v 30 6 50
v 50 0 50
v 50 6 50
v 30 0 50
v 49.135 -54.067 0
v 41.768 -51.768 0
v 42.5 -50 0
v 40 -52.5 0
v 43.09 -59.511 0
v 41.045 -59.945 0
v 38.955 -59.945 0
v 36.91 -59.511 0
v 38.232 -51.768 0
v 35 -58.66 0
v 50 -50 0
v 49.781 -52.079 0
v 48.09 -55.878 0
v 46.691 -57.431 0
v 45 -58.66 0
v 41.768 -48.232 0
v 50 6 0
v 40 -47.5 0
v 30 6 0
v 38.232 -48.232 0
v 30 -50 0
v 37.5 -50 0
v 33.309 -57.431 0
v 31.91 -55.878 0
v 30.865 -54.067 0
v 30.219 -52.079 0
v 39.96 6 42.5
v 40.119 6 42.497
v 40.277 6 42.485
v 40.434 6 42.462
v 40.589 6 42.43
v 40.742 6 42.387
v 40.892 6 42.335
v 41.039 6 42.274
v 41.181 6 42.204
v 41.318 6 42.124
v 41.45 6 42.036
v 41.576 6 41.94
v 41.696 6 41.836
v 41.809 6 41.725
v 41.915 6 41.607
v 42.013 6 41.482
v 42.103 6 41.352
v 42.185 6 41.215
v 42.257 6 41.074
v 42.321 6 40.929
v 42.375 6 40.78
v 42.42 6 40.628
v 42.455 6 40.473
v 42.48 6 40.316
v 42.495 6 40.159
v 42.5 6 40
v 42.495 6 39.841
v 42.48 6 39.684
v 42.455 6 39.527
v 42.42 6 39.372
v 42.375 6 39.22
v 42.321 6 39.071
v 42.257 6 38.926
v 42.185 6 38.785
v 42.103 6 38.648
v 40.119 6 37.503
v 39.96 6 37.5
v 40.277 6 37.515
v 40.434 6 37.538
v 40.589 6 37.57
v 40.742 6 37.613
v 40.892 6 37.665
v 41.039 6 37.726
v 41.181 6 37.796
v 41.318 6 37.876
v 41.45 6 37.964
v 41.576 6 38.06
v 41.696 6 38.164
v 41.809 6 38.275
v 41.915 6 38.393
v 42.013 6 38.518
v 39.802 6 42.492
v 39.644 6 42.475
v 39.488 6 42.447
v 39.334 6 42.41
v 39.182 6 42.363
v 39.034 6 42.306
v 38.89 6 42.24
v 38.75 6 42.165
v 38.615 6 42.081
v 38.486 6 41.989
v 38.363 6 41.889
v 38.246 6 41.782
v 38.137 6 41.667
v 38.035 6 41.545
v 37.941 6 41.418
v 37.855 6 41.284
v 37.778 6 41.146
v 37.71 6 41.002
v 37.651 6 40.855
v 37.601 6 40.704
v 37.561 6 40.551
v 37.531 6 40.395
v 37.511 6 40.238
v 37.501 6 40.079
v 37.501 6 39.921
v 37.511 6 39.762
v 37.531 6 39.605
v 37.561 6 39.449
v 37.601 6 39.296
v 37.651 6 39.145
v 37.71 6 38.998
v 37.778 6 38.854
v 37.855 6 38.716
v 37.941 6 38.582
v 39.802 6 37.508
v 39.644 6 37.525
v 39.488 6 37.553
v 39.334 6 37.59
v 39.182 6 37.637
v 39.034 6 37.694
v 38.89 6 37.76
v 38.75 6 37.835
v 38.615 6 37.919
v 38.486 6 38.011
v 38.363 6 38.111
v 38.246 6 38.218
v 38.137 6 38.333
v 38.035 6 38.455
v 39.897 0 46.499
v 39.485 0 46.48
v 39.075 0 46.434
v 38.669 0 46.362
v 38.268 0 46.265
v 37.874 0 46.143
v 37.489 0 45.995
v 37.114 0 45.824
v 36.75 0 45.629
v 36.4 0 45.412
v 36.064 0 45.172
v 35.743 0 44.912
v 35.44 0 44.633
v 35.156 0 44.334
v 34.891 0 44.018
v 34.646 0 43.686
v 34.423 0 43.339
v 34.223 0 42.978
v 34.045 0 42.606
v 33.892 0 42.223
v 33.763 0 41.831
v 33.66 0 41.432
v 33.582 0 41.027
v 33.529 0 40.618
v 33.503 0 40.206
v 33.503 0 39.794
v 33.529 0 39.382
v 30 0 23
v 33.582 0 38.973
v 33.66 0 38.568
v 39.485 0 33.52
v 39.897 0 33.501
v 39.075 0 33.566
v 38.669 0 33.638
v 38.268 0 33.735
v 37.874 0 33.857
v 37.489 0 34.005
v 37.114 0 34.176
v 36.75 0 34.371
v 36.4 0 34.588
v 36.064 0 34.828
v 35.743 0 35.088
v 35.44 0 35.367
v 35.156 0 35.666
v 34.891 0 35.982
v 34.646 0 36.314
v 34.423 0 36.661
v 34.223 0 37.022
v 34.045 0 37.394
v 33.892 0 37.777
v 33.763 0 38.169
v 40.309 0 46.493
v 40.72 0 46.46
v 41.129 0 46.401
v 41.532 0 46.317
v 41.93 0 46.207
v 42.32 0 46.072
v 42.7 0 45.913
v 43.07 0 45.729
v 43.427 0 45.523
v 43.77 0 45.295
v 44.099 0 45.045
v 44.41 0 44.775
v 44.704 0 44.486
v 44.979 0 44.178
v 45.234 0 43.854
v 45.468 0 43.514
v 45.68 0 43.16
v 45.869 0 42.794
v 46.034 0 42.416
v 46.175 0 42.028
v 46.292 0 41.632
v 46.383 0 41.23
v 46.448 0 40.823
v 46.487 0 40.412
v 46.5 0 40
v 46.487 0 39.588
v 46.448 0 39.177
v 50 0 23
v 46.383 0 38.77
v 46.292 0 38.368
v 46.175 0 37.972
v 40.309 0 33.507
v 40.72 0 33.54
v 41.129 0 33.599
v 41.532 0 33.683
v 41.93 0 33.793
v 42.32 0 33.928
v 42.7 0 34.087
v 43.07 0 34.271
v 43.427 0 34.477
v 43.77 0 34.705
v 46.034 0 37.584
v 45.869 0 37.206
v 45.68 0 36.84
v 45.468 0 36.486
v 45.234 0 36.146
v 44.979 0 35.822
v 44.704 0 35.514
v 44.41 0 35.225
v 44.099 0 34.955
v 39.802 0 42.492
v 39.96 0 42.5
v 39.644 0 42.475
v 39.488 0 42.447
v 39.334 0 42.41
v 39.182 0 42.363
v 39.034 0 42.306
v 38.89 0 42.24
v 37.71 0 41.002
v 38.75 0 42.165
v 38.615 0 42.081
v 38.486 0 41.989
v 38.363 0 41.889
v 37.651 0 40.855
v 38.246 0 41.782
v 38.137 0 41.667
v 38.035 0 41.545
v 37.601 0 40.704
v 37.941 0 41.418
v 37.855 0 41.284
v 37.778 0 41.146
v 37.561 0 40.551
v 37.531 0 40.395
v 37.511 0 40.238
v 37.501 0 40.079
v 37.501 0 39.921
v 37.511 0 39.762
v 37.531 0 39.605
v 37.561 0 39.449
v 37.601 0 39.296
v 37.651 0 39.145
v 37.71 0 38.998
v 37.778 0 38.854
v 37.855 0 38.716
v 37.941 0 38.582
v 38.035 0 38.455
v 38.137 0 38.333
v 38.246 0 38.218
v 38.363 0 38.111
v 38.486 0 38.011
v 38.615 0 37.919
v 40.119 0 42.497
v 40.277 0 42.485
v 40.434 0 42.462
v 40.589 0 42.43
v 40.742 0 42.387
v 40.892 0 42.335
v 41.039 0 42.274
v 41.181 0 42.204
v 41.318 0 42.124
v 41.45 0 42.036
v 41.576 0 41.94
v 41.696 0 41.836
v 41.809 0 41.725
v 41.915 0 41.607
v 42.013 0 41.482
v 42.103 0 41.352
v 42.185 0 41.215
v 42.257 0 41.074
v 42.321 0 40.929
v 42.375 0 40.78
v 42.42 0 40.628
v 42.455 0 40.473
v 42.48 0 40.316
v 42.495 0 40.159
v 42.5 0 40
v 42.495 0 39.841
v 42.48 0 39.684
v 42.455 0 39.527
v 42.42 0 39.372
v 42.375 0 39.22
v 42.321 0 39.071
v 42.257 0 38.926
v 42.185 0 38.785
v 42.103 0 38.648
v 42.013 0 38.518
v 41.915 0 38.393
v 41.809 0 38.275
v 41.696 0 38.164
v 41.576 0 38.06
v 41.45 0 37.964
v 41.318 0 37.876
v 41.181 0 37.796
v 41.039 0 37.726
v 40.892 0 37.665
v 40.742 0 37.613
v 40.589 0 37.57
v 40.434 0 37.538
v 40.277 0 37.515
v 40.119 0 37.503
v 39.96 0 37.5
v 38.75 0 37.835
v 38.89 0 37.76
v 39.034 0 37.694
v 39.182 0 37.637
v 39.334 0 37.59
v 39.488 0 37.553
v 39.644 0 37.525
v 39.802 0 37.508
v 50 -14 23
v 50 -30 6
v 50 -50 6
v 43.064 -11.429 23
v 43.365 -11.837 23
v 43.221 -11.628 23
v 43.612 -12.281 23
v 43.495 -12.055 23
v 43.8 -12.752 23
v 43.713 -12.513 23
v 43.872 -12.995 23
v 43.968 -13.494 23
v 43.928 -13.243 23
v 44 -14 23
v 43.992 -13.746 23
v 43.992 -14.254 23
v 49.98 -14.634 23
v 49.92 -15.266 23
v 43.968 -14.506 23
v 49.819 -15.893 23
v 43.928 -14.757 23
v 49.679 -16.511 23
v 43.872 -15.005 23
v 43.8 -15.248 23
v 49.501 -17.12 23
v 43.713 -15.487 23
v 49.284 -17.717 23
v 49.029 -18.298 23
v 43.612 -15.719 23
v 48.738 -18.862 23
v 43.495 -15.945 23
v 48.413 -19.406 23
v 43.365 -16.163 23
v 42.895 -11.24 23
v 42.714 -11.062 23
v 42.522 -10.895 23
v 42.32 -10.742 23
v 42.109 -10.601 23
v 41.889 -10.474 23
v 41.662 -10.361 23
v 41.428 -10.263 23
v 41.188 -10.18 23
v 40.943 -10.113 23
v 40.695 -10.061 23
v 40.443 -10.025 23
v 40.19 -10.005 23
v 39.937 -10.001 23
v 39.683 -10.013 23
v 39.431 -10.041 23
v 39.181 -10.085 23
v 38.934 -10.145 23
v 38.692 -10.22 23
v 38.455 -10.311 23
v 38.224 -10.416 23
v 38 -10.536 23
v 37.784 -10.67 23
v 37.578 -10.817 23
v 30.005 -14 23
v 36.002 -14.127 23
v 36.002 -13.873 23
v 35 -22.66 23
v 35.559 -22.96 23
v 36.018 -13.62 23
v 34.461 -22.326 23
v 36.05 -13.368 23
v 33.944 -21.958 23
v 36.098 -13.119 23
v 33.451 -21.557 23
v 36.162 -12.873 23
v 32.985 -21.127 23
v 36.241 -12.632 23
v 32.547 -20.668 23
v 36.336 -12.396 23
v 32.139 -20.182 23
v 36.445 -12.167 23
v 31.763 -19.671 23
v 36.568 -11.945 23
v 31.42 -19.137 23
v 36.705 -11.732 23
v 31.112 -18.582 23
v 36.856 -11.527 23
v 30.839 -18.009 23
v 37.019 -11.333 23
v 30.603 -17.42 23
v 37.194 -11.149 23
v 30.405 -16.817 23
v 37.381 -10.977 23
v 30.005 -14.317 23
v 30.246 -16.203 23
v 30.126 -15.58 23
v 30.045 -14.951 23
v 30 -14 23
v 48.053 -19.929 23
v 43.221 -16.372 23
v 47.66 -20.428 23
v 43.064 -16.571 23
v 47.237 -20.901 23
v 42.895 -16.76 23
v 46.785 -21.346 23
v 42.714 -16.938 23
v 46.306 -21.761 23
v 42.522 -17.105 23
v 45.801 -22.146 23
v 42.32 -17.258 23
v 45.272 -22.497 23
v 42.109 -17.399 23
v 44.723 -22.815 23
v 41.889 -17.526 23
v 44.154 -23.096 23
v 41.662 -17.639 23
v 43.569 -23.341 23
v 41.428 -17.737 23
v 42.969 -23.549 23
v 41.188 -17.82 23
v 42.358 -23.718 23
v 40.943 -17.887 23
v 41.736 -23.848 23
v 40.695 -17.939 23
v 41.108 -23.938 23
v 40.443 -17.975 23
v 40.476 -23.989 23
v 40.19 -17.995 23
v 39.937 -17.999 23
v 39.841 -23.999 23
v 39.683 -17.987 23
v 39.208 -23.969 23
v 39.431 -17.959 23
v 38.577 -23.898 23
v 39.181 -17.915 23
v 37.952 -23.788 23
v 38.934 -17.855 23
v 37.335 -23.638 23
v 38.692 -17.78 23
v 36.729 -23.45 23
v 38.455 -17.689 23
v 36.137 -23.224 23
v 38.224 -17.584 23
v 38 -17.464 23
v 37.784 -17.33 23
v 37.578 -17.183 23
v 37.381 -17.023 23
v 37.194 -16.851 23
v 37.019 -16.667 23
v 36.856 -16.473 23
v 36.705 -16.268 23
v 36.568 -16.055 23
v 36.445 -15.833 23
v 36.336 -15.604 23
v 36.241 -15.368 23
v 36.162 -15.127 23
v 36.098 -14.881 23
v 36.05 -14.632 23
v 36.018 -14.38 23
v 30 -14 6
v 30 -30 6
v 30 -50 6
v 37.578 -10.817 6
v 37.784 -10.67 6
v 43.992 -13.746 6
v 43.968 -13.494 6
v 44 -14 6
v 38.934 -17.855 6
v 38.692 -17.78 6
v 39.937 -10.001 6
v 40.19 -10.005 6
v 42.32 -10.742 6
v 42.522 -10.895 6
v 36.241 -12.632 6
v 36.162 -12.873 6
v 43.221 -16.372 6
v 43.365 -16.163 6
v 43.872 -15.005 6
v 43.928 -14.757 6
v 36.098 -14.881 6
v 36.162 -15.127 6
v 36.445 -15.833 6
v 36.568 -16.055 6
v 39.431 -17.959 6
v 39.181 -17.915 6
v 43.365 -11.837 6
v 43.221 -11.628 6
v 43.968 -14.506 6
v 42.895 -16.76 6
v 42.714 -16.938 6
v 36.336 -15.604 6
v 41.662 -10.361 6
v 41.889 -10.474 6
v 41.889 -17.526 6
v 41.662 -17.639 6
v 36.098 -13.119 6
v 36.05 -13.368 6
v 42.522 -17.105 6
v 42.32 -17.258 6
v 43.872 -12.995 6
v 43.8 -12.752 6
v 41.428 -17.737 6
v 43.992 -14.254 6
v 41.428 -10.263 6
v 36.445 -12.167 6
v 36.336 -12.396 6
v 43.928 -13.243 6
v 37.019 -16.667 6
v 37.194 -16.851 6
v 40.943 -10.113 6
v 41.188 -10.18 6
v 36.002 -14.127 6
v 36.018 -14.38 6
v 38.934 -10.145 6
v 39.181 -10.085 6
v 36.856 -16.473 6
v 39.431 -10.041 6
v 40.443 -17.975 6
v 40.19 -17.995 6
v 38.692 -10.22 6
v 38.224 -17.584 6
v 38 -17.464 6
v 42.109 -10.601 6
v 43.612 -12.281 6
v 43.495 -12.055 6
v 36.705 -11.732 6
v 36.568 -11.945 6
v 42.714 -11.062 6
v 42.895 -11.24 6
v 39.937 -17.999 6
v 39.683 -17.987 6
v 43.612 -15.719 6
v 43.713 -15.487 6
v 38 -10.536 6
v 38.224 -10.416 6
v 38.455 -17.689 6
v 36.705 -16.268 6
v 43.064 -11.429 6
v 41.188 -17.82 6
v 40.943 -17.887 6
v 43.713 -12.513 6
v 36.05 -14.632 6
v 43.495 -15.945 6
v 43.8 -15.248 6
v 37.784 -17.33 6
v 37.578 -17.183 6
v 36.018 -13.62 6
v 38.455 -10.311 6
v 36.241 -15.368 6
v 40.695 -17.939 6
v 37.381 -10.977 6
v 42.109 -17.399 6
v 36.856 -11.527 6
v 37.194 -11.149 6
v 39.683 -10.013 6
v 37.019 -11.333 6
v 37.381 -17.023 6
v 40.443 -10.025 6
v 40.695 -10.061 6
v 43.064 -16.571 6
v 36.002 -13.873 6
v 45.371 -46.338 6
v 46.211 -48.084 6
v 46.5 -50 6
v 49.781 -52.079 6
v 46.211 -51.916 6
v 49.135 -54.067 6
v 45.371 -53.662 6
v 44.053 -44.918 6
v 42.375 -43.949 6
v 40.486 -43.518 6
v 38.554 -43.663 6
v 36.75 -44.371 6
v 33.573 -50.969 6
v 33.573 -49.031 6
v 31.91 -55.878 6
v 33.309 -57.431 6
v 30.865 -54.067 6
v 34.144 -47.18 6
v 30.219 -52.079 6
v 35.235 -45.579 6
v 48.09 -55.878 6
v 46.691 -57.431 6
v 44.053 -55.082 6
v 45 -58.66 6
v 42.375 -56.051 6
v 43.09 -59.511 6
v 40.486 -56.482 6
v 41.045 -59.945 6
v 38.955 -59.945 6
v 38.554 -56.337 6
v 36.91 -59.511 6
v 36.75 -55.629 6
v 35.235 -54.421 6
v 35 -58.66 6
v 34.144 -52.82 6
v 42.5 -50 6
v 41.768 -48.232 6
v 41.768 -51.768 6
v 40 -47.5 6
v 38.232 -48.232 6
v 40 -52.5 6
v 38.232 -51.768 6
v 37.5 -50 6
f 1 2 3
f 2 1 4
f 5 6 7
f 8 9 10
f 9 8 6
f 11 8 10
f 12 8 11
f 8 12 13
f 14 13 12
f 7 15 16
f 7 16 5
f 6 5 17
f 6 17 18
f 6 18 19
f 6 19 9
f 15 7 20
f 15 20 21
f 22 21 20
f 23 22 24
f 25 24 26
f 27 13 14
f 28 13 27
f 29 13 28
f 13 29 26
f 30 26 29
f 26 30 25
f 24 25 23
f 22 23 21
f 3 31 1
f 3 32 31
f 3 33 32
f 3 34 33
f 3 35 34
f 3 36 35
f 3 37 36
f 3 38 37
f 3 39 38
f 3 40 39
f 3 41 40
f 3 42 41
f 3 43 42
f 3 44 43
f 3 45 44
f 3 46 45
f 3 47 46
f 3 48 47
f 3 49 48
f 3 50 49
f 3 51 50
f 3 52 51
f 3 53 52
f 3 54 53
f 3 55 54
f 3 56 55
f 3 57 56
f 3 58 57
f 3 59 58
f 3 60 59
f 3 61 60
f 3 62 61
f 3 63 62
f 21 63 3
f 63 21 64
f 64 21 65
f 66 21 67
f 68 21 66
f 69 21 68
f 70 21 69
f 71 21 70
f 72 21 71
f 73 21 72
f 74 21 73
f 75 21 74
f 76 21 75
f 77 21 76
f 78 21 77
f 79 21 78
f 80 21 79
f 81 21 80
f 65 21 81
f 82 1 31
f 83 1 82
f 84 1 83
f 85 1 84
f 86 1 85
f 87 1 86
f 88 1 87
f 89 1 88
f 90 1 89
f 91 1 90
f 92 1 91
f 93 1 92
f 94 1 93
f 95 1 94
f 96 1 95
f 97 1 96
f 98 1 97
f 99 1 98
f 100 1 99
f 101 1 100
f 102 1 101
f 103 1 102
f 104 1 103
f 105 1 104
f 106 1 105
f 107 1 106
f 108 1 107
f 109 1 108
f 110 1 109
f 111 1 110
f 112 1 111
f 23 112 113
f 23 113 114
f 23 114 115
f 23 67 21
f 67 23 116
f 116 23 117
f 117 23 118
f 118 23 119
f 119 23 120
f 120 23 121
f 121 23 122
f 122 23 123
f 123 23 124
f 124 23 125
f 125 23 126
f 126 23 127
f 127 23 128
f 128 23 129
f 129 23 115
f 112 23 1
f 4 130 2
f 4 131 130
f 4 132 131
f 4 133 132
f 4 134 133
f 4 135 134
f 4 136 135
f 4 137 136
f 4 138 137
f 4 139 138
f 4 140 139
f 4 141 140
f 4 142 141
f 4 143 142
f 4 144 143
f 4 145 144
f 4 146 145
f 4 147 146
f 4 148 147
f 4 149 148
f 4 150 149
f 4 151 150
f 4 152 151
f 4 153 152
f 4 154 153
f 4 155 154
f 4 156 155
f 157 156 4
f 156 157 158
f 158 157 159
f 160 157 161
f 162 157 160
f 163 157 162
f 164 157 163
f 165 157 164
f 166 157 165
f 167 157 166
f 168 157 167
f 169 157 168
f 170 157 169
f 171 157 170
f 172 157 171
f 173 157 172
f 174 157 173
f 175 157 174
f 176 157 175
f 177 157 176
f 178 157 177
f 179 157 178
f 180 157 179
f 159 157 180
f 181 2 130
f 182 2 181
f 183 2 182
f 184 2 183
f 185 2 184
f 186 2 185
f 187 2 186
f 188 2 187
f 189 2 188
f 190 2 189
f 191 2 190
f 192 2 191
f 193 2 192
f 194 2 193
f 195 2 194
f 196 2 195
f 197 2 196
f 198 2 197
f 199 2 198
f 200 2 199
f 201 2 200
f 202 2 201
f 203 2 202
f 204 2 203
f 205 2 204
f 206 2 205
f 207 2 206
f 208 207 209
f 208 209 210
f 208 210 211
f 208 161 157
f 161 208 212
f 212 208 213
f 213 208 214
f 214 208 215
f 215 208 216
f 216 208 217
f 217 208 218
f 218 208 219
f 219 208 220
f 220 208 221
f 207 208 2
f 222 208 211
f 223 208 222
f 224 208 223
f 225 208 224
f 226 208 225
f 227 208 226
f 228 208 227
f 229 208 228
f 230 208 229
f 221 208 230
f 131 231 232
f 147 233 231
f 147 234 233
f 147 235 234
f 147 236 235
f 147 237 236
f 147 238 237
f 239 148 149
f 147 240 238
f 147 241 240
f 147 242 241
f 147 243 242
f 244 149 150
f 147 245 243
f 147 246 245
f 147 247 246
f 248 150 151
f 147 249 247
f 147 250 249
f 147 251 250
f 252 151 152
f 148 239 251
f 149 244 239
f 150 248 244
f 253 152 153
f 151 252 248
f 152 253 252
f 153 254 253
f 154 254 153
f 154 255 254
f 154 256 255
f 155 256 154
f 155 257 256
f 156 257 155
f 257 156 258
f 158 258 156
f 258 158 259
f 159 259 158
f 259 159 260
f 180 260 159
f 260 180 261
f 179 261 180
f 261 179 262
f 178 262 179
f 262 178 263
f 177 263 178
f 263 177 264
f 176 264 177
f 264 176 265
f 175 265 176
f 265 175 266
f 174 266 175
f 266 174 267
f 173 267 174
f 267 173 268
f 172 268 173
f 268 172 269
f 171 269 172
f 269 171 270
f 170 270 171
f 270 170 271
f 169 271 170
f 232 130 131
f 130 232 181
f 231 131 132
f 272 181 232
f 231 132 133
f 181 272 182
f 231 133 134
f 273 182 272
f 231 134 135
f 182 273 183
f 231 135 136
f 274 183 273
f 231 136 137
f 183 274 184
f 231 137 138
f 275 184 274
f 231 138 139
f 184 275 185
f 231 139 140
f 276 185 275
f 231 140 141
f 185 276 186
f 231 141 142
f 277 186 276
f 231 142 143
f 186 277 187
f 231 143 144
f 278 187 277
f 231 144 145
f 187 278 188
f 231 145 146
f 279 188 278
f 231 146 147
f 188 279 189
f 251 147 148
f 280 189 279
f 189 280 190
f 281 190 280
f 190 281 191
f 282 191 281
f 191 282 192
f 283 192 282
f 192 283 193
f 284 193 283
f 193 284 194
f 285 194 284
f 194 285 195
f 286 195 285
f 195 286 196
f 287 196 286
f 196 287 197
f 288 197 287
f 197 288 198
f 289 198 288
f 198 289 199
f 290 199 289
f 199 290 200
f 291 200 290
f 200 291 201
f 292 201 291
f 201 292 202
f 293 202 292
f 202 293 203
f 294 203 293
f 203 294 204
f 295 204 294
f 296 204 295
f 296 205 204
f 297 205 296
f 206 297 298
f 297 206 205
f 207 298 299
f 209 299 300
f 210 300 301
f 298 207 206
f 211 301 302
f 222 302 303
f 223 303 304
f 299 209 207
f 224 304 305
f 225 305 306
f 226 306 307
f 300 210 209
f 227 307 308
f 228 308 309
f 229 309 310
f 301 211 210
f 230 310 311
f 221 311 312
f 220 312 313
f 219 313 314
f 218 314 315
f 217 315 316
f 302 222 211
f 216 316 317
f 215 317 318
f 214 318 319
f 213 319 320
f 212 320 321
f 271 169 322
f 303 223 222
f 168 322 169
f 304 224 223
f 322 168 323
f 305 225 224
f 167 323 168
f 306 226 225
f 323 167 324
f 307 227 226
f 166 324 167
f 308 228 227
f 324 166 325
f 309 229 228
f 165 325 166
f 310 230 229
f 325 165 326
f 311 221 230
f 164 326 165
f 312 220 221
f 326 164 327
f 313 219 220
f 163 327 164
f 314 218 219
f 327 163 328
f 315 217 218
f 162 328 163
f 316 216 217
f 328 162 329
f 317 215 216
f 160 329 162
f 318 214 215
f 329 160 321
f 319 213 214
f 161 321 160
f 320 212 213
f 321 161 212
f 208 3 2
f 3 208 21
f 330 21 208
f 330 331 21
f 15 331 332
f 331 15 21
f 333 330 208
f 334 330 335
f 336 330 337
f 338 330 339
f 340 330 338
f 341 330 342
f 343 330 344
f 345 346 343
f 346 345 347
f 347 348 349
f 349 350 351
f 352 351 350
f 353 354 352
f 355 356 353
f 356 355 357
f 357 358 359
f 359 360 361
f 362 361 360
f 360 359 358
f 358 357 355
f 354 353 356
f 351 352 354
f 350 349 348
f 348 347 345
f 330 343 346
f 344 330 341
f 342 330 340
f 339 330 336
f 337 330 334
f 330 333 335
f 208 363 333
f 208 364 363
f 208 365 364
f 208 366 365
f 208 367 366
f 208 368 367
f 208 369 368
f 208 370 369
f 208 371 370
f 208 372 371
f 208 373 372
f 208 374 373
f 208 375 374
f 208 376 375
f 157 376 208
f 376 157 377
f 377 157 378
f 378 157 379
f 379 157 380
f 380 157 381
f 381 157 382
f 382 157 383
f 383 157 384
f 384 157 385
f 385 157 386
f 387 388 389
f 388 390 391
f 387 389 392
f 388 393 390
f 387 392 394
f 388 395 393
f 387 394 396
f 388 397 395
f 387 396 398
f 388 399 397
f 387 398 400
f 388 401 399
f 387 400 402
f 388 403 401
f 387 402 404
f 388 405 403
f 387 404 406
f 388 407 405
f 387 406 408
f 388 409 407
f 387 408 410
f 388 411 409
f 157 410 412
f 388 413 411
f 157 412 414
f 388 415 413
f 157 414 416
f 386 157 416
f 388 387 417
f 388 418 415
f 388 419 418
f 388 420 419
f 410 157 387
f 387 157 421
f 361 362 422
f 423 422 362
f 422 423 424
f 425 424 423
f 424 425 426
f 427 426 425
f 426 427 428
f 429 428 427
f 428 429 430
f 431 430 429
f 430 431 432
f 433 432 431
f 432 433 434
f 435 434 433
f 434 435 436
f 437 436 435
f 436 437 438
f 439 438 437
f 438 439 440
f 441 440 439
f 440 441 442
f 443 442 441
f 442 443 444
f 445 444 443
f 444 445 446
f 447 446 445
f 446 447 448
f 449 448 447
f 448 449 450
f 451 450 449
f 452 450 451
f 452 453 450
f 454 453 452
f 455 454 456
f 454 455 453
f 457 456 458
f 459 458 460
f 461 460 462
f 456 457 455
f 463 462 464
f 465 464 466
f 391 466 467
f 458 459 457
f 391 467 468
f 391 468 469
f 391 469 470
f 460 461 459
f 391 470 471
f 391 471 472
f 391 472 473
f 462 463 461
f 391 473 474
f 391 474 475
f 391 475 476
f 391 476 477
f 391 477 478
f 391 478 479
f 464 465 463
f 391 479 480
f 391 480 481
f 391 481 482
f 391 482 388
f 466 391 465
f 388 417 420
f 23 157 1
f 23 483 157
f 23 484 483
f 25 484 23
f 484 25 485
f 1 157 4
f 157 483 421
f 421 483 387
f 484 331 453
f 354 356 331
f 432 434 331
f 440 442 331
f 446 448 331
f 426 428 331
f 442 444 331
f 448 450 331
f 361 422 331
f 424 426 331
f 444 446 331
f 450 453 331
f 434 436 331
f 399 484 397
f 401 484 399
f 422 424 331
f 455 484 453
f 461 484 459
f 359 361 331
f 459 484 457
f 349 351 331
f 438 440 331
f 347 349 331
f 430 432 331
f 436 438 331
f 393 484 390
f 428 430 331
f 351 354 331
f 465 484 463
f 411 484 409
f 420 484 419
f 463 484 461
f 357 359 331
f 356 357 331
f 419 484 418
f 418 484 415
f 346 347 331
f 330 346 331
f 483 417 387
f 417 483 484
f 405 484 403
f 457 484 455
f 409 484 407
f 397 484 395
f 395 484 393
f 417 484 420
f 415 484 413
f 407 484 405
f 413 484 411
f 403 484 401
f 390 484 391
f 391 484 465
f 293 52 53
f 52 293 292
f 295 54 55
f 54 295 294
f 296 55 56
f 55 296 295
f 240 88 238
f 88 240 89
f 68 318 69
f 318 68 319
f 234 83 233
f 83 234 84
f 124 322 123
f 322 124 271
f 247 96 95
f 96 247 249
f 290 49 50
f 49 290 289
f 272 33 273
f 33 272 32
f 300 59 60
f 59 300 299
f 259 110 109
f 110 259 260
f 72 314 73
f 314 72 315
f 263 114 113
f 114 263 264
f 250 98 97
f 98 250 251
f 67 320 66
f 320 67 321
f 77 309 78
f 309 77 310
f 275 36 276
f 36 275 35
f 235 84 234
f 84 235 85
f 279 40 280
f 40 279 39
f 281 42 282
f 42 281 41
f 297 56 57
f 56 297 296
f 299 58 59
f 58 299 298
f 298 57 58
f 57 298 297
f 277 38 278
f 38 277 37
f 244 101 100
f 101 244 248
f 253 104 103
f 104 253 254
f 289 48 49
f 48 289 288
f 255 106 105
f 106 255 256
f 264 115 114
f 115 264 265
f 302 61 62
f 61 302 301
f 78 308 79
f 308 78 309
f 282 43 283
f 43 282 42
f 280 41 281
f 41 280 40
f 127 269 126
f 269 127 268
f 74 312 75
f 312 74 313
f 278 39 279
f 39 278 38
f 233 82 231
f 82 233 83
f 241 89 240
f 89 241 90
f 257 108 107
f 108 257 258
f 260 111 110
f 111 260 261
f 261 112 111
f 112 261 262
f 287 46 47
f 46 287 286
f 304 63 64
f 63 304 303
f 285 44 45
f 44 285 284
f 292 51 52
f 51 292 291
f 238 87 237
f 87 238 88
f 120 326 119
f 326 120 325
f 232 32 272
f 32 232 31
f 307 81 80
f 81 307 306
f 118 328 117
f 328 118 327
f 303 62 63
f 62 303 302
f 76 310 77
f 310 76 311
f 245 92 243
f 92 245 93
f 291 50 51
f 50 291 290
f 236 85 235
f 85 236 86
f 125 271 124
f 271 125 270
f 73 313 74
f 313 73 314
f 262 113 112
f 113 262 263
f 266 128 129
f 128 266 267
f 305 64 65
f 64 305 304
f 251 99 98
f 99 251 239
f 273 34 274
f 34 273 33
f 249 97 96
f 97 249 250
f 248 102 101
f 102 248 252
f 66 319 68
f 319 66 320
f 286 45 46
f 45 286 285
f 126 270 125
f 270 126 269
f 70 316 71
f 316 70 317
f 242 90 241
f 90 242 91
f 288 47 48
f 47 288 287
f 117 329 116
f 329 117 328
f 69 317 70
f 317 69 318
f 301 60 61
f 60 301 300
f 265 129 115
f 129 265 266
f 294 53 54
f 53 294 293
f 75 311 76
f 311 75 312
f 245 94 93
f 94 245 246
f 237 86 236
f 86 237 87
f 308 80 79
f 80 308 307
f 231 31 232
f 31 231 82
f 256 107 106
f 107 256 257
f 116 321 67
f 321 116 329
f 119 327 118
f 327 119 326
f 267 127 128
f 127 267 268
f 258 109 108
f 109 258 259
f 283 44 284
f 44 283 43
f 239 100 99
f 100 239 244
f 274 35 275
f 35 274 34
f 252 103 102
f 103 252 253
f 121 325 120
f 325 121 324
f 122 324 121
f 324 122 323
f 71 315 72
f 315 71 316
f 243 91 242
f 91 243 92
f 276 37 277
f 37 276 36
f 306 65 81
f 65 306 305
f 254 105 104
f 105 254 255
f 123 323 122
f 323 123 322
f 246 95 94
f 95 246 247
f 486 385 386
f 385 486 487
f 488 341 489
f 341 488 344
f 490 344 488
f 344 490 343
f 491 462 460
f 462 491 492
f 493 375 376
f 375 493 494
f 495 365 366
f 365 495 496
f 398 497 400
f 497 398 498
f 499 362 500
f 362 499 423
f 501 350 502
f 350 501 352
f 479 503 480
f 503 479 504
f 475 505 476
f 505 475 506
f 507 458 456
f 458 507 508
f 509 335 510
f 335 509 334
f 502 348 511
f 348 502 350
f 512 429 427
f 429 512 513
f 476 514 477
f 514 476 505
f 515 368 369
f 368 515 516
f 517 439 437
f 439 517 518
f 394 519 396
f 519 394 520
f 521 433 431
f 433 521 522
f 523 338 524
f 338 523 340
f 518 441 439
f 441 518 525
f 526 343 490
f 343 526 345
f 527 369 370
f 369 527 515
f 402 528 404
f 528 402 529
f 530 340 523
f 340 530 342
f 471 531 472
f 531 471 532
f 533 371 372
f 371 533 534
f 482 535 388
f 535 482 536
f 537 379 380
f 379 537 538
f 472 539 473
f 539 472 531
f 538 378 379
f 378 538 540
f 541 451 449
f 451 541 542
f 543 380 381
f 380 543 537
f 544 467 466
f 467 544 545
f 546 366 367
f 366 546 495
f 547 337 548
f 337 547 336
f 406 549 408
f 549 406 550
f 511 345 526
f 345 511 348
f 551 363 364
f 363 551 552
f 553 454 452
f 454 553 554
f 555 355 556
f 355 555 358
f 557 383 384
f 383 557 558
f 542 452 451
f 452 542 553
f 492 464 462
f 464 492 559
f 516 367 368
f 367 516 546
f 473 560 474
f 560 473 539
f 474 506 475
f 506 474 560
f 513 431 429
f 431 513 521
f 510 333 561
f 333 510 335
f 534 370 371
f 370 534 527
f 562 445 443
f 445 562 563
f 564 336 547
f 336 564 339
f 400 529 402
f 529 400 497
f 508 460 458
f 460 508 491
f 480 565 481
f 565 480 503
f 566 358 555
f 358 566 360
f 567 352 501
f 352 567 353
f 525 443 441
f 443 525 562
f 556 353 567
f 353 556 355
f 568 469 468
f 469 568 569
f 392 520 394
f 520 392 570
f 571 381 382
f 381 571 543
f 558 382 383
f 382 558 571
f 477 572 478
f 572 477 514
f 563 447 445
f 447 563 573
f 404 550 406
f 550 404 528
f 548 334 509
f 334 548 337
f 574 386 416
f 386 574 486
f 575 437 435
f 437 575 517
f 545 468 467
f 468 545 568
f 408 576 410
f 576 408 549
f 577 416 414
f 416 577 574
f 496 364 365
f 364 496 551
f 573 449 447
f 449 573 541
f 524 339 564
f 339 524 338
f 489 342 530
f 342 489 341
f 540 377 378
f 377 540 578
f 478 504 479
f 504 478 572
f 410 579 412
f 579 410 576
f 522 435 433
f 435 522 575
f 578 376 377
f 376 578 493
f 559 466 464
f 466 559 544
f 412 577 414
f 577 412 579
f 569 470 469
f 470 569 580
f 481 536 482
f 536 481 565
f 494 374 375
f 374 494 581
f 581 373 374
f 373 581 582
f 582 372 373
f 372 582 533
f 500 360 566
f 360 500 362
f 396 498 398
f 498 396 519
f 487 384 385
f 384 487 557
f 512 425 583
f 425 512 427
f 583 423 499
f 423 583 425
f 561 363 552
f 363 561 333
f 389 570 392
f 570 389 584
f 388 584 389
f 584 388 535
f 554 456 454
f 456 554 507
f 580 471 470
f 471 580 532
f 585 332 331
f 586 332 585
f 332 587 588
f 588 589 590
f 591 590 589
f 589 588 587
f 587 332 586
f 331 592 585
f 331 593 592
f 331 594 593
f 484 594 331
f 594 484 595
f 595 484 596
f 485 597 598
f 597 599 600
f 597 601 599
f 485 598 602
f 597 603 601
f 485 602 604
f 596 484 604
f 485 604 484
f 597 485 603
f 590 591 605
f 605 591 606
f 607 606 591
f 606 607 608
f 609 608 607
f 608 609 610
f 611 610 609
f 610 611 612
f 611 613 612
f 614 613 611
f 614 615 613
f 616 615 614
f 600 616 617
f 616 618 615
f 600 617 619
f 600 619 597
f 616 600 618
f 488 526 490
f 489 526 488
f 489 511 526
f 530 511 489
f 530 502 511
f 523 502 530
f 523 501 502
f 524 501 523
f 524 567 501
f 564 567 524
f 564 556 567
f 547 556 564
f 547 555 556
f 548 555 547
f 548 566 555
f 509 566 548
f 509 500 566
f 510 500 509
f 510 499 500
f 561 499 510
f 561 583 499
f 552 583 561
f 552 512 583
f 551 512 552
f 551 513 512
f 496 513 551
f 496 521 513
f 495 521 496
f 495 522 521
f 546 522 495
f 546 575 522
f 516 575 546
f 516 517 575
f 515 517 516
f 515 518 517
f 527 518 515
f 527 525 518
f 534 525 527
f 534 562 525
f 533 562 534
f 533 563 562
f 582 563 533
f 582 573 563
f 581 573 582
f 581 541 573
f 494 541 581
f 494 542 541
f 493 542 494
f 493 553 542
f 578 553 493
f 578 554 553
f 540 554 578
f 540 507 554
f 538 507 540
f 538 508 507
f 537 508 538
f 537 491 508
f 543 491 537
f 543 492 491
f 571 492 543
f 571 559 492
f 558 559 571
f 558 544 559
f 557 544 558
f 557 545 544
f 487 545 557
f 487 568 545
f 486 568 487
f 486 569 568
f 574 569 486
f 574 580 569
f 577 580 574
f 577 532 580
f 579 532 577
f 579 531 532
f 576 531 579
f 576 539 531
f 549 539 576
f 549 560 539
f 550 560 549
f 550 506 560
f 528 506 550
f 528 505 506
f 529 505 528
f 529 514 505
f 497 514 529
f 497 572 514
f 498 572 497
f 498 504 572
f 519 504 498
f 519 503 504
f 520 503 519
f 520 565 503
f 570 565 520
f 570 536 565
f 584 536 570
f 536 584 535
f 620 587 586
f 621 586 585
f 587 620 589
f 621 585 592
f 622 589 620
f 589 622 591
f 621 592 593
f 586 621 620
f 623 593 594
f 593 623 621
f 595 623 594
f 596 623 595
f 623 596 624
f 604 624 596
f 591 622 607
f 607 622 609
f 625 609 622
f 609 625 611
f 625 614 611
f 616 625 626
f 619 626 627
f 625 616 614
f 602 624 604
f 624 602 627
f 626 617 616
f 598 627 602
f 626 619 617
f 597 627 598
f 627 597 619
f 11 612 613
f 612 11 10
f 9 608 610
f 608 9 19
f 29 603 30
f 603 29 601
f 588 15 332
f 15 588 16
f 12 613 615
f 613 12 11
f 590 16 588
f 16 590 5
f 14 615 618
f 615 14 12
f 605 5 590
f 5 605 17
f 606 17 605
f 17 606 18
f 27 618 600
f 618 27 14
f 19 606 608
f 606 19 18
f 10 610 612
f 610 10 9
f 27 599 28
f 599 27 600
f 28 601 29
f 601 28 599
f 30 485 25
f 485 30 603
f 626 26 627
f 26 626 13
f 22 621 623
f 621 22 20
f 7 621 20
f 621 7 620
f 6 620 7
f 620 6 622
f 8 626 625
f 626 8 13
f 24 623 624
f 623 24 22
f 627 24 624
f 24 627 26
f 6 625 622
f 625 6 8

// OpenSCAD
// file: bolt.scad
include <configuration.scad>;

module bolt(){
	union(){
		translate([0, 0, -boltLength]) cylinder(r=boltOuterRadius, h=boltLength+1);
		cylinder(r=washerOuterRadius, h=washerLength);
	}
}

// a bolt and washer intended for making equivalent holes
// the parameter from indicates which side the bolt is inserted from
module boltWasher(from="x-"){
	if(from=="x+"){
		rotate([0, 90, 0]) bolt();
	} else
	if(from=="x-"){
		rotate([0, -90, 0]) bolt();
	} else
	if(from=="y+"){
		rotate([-90, 0, 0]) bolt();
	} else
	if(from=="y-"){
		rotate([90, 0, 0]) bolt();
	} else
	if(from=="z+"){
		rotate([0, 0, 0]) bolt();
	} else
	if(from=="z-"){
		rotate([180, 0, 0]) bolt();
	}
}

boltWasher("x-");
// file: configuration.scad
// Copyright (C) 2012 t00tie
// Adapto is licensed under the Creative Commons - GNU GPL license.
// http://creativecommons.org/licenses/GPL/2.0/

// Configuration file for Adapto OpenSCAD files

boltOuterRadius=5/2;// outer radius of bolt threads, 5 for M5 bolts
boltLength=60;//bolt length without head (threaded part only)
washerOuterRadius=13/2;// washers that fit the bolts
washerLength=10;// this is large because it is used to make holes for washers

frameX=20;// width of frame parts (alu, wood etc.)
frameY=20;// ditto

boltOffset=frameX/2;// How far in the bolt holes go, may need tweaking if framX!=frameY

smoothRod=8;// diameter of smooth rods


// Copied from 
// PRUSA Mendel  
// Default metric sizes
// GNU GPL v3
// Josef Průša
// josefprusa@me.com
// prusadjs.cz
// http://www.reprap.org/wiki/Prusa_Mendel
// http://github.com/prusajr/PrusaMendel
m3_nut_diameter = 5.3;
m3_nut_diameter_bigger = ((m3_nut_diameter  / 2) / cos (180 / 6))*2;
// file: Z_Smooth_Rod_Holder_Upper_2_Off.scad
// Copyright (C) 2012 t00tie
// After an stl designed by RoTorIT
// Adapto is licensed under the Creative Commons - GNU GPL license.
// http://creativecommons.org/licenses/GPL/2.0/

include <configuration.scad>;
use <bolt.scad>;

$fn=99;
thickness=6;// thickness of single wall parts
smoothRodOffset=14;// how far the centre of the z smooth rods are from the frame

ZUpper();

module ZUpper(){
	difference(){
		union(){
			cube([80, thickness, 50]);
			translate([0, -30, 0]) cube([80, 30, thickness]);
			//translate([40-max(frameX, 20)/2, 0, 0]) cube([max(frameX, 20), thickness, 80]);
			translate([30, -smoothRodOffset, 0]) cube([smoothRod+2*thickness, smoothRod/2+smoothRodOffset, 17+thickness]);
			hull(){
				translate([40, -(smoothRodOffset), 0]) cylinder(r=smoothRod/2+thickness, h=17+thickness);
				translate([40-max(frameX, 20)/2, -30, 0]) cube([max(frameX, 20), 30, thickness]);
			}
		}
		translate([frameX/2, 0, thickness+frameY/2]) boltWasher("y-");
		translate([80-frameX/2, 0, thickness+frameY/2]) boltWasher("y-");
		translate([80/2, 0, 50-frameX/2]) boltWasher("y-");

		translate([0, 0, -1]) rotate([0, 0, -90-45]) cube([99, 99, thickness+2]);
		translate([80, 0, -1]) rotate([0, 0, -90-45]) cube([99, 99, thickness+2]);
		translate([30, -1, 50]) rotate([0, -90-45, 0]) cube([99, thickness+2, 99]);
		translate([50, -1, 50]) rotate([0, 90-45, 0]) cube([99, thickness+2, 99]);

		translate([40, -smoothRodOffset, -1]) cylinder(r=smoothRod/2, h=17+thickness+2);
	}
}
// main file
// Copyright (C) 2012 t00tie
// After an stl designed by RoTorIT
// Adapto is licensed under the Creative Commons - GNU GPL license.
// http://creativecommons.org/licenses/GPL/2.0/


// This is rather quick'n'dirty but the upper and lower are so similar it's smart
use <Z_Smooth_Rod_Holder_Upper_2_Off.scad>;

include <configuration.scad>;
use <bolt.scad>;
thickness=6;

difference() {
	union(){
		ZUpper();
		translate([30, -50, 0]) cube([max(frameX, 20), 50, thickness]);
		translate([30+max(frameX, 20)/2, -50, 0]) cylinder(r=max(frameX, 20)/2, h=thickness);
	}
	translate([-1, -50, -1]) cube([31, 100,100]);
	translate([50, -50, -1]) cube([31, 100,100]);
	translate([30+max(frameX, 20)/2, -50, thickness]) boltWasher("z+");
}
